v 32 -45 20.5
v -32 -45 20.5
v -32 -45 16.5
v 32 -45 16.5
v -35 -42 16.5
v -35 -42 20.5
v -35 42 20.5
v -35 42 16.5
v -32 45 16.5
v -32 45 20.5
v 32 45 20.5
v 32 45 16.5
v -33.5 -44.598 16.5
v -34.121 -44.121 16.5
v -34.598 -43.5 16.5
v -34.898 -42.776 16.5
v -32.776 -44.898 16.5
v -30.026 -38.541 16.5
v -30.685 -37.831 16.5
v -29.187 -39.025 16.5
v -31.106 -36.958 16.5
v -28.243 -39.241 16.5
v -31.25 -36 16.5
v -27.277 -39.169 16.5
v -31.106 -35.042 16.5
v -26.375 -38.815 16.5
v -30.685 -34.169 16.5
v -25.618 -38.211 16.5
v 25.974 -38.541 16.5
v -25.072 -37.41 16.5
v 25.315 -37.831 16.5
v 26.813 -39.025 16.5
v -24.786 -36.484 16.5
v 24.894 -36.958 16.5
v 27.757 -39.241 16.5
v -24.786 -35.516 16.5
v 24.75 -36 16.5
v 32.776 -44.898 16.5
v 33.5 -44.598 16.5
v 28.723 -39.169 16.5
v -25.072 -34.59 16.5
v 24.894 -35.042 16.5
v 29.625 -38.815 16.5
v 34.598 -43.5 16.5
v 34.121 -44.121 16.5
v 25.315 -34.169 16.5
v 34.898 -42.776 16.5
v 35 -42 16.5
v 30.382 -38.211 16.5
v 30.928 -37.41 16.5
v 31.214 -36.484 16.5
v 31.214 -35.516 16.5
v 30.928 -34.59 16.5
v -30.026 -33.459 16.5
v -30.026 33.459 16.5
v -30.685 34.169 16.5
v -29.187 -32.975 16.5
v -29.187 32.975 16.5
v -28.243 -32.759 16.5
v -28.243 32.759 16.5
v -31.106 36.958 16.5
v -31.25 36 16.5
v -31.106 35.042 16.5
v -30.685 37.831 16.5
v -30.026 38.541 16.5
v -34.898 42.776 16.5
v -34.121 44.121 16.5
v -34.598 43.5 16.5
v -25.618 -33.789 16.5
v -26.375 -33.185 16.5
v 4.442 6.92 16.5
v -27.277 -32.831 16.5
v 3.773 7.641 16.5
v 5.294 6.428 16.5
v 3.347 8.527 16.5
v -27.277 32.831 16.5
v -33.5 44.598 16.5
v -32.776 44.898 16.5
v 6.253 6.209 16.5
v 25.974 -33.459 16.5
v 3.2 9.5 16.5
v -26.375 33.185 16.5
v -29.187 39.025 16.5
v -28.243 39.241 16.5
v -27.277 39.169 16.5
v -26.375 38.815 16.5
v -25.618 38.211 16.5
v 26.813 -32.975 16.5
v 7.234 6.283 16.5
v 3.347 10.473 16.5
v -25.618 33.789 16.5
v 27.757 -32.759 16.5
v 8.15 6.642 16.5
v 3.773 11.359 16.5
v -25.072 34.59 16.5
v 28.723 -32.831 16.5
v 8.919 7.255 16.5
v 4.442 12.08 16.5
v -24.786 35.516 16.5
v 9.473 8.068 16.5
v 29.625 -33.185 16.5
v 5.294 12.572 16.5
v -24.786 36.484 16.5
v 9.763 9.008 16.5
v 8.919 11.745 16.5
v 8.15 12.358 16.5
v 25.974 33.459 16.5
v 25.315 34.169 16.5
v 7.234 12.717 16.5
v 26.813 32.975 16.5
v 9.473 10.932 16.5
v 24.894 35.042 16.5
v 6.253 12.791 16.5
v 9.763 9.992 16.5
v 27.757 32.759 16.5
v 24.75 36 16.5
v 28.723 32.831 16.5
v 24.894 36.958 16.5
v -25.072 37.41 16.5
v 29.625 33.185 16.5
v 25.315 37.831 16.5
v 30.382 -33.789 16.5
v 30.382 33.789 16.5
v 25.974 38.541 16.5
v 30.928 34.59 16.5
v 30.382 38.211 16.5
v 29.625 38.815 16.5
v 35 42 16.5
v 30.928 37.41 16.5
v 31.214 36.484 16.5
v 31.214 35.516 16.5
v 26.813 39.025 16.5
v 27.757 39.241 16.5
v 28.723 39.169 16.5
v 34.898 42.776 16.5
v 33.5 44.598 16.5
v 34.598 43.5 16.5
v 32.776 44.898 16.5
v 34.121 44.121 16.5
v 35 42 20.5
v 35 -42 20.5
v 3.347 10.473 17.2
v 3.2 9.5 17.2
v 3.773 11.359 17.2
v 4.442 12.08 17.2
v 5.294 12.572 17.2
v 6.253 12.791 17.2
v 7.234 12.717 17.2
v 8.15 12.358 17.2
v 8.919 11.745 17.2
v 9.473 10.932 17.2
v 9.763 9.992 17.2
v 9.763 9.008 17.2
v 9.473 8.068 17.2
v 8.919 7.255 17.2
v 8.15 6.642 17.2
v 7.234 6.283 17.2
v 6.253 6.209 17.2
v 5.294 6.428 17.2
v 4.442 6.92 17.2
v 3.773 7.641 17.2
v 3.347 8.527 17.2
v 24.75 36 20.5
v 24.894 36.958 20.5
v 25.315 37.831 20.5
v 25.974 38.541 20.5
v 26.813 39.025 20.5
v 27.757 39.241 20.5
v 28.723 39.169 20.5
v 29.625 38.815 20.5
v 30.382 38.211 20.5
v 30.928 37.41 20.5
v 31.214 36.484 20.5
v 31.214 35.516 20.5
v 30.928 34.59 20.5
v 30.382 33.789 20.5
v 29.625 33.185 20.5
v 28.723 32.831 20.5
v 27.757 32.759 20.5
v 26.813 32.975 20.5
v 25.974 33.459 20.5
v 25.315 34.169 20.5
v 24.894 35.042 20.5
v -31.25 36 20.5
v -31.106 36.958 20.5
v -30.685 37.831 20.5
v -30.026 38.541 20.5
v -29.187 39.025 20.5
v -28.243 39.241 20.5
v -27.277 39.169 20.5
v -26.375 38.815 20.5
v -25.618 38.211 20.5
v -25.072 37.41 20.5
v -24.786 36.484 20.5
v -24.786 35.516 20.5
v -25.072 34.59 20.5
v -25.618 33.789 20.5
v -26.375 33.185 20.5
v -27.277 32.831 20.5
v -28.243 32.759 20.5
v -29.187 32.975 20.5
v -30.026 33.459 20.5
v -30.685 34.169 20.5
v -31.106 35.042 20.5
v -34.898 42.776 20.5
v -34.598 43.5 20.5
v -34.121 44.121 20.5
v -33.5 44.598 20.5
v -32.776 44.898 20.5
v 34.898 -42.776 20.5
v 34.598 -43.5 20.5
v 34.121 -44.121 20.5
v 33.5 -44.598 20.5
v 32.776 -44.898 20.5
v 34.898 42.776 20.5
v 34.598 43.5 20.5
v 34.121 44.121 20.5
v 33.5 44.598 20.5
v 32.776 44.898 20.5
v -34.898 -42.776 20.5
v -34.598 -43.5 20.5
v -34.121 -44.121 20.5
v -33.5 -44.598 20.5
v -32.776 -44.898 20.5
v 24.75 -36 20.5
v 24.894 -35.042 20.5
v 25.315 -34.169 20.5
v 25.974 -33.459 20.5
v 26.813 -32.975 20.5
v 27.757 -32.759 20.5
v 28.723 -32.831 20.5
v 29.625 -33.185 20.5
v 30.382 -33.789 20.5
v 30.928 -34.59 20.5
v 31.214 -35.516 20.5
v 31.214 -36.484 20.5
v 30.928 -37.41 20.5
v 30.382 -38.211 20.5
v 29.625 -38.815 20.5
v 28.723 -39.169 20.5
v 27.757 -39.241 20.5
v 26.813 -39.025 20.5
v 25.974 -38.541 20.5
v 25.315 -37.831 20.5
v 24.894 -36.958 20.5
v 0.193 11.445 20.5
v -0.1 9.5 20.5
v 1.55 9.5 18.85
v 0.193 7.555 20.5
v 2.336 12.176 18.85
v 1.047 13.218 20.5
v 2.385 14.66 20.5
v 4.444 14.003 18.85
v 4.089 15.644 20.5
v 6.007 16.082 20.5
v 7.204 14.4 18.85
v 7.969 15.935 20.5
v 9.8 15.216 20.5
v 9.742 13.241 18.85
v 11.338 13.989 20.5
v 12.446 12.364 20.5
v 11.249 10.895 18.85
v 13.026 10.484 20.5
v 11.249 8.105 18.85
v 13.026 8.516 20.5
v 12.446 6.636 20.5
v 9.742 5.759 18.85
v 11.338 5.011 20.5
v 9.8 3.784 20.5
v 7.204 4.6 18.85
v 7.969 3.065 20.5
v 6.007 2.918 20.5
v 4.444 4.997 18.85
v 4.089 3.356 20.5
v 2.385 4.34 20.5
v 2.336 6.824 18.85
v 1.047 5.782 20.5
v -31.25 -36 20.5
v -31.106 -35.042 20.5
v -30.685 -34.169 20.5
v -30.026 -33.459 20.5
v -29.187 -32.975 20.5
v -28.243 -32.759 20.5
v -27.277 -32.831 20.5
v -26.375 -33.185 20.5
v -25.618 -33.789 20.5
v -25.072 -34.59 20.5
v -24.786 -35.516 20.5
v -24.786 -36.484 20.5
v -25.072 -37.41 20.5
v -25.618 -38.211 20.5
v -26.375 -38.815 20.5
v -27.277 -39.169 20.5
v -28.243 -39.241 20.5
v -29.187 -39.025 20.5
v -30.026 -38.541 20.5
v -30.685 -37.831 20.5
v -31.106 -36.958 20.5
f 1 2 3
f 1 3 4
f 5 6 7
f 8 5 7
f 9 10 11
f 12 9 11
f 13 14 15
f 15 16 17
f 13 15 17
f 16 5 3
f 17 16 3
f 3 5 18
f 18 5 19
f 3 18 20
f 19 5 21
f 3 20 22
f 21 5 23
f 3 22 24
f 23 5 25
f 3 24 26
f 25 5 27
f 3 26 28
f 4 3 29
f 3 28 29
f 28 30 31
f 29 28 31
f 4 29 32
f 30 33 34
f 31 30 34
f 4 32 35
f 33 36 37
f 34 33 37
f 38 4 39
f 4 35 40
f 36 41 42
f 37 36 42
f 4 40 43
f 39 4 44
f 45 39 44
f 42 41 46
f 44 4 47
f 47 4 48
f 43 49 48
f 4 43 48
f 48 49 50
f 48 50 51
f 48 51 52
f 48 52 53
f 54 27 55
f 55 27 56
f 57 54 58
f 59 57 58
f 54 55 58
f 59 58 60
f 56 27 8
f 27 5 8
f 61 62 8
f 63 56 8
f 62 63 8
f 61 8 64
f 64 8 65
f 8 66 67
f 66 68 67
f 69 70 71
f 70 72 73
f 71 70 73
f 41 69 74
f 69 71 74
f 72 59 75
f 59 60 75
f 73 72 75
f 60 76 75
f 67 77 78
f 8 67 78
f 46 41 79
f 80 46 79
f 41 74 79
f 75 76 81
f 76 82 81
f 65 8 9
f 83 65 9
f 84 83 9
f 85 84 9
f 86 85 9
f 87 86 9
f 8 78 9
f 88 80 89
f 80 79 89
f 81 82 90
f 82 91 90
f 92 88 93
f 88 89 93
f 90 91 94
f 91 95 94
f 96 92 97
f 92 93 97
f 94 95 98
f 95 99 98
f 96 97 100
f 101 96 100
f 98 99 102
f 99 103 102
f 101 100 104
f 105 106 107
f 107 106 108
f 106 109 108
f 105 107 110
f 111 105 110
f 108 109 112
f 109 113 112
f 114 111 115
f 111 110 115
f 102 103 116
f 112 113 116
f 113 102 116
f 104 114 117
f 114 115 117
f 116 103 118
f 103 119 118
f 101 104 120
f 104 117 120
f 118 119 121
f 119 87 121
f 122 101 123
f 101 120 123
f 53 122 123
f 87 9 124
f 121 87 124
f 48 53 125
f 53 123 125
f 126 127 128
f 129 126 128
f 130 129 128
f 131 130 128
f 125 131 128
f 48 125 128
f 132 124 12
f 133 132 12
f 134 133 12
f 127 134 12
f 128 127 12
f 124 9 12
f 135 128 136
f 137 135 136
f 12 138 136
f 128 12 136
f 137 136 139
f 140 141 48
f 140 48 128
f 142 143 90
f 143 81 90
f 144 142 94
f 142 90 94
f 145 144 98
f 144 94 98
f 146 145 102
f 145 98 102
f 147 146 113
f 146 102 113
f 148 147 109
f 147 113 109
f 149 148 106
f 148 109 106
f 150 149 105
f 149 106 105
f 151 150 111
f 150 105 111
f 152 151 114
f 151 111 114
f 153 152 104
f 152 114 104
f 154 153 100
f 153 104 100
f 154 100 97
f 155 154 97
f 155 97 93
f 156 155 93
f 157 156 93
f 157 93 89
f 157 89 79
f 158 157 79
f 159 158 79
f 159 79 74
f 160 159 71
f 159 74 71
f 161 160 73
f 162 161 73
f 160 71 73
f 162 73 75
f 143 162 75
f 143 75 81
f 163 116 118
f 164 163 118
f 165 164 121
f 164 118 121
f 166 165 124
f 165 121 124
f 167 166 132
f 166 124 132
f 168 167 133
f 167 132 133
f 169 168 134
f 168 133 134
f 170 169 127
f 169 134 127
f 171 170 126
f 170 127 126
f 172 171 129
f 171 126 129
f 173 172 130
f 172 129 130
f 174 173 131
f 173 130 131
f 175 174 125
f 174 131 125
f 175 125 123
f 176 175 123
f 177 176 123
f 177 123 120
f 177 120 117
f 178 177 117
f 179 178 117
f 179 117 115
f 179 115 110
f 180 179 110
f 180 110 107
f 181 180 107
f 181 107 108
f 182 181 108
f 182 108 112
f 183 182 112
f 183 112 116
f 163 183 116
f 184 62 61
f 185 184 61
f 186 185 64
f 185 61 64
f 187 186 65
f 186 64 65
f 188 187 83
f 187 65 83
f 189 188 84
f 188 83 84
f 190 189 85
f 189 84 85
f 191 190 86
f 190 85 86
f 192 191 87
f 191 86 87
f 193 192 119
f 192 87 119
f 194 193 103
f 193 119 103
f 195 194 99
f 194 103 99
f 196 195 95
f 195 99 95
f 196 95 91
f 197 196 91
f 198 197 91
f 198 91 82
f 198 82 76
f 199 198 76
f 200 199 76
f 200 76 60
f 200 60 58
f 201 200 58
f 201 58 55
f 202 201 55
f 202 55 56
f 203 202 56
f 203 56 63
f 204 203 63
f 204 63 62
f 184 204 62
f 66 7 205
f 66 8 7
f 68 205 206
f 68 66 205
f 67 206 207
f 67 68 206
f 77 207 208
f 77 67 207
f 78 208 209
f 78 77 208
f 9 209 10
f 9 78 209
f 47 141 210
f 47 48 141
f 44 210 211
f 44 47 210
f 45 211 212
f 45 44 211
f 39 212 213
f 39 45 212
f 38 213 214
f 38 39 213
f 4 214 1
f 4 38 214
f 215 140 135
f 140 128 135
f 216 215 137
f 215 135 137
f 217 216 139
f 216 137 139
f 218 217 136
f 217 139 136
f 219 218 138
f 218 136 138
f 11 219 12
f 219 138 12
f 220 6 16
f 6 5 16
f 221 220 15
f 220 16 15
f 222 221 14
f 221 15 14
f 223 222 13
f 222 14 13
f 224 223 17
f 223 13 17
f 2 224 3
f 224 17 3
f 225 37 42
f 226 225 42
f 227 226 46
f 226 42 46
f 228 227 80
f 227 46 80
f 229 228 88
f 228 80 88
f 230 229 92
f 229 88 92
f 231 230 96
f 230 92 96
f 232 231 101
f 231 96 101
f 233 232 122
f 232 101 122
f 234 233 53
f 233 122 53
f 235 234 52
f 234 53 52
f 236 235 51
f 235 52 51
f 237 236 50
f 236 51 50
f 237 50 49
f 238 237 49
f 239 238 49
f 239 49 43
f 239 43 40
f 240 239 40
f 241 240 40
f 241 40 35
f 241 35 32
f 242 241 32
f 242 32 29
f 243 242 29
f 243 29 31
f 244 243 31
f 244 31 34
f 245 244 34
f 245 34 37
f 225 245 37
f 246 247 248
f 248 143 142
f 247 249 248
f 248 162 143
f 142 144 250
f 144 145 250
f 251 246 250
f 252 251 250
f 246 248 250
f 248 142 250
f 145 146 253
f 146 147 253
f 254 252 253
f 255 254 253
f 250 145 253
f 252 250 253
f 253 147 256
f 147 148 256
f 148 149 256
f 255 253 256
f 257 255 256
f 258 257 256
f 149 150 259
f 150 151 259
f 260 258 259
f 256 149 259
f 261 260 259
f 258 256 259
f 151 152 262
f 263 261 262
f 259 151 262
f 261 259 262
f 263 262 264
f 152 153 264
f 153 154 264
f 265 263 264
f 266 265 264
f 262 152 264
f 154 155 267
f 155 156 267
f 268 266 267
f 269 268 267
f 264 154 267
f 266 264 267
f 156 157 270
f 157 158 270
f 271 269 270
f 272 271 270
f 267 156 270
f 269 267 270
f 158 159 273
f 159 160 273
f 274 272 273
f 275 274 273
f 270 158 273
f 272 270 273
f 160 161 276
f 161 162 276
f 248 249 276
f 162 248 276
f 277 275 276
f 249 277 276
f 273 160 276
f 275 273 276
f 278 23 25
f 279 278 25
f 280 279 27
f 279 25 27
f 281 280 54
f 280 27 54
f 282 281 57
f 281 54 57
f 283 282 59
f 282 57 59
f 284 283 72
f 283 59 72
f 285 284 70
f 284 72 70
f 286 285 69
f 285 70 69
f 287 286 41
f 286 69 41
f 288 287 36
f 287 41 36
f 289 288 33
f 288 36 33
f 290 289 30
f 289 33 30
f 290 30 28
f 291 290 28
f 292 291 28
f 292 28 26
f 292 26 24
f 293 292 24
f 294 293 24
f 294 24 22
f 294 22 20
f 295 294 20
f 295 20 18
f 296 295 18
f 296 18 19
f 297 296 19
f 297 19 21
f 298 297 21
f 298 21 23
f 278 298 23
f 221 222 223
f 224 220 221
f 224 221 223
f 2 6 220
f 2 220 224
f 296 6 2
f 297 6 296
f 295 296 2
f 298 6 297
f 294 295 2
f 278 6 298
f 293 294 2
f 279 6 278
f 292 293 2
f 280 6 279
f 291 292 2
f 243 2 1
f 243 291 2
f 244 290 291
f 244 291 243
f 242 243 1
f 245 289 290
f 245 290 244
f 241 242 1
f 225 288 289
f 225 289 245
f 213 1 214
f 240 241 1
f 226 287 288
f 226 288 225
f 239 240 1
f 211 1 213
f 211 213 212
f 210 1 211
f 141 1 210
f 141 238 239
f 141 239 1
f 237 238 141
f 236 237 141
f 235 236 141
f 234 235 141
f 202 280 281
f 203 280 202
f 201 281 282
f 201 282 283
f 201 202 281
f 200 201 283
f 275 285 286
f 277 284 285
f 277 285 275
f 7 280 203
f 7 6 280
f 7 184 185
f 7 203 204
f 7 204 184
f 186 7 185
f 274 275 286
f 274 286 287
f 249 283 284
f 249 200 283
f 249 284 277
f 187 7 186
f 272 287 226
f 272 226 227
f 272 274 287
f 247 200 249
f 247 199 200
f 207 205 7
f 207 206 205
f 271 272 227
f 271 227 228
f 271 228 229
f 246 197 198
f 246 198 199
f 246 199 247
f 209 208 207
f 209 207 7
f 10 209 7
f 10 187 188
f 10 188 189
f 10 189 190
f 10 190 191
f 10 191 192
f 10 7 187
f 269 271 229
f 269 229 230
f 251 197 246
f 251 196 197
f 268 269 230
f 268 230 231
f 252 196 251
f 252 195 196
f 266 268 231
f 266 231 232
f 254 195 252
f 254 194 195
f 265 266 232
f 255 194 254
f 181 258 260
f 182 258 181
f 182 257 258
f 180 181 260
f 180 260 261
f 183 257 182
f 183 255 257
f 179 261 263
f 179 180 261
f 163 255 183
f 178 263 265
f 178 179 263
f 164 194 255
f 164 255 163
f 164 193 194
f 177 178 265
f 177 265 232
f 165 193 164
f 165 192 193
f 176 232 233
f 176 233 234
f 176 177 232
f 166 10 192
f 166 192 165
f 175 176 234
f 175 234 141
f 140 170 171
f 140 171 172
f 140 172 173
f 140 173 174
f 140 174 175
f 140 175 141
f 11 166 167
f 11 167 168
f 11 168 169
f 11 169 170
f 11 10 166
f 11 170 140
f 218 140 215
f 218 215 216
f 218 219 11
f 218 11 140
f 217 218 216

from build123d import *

# Parameters (mm, degrees)
SKETCH_1_W                  = 55
SKETCH_1_H                  = 60
EXTRUDE_1_DEPTH             = 16.5
HOLE_WIZARD_3_6_3_6_1_D     = 3.6
HOLE_WIZARD_3_6_3_6_1_DEPTH = 25
HOLE_WIZARD_3_6_3_6_1_TIP   = 1.081549114
HOLE_WIZARD_M2_5_1_D        = 2.05
HOLE_WIZARD_M2_5_1_DEPTH    = 14
HOLE_WIZARD_M2_5_1_TIP      = 0.615882135
SKETCH_8_W                  = 35
SKETCH_8_H                  = 20.4
CUT_EXTRUDE_1_DEPTH         = 44.914690025
CUT_EXTRUDE_START           = 2.5
SKETCH_9_W                  = 20
SKETCH_9_H                  = 6
CUT_EXTRUDE_2_DEPTH         = 42.414690025
SHELL_START                 = 1.8
SHELL_1_DEPTH               = 14.7
EXTRUDE_2_DEPTH             = 4
SKETCH_16_R                 = 3
CUT_EXTRUDE_4_DEPTH         = 12
CUT_EXTRUDE_5_DEPTH         = 45.787721532
CUT_EXTRUDE_5_DEPTH_BACK    = 45.787721532
SKETCH_17_R                 = 2.5
FILLET_1_R                  = 0.5
FILLET_2_R                  = 0.5
SKETCH_21_W                 = 70
SKETCH_21_H                 = 90
EXTRUDE_3_DEPTH             = 4
SKETCH_24_R                 = 8.656208536
SKETCH_24_R_2               = 4.782814597
EXTRUDE_4_DEPTH             = 4
HOLE_WIZARD_6_5_6_5_1_D     = 6.5
HOLE_WIZARD_1_D             = 6.6
HOLE_WIZARD_1_DEPTH         = 17
HOLE_WIZARD_1_CSINK_D       = 13.2
HOLE_WIZARD_1_CSINK_ANGLE   = 90
HOLE_WIZARD_1_TIP           = 1.982840043
FILLET_3_R                  = 3


# Read off the part's stored shape, not the designer's step: 抽壳1
with BuildPart() as part:
    # 草图1 → 凸台-拉伸1 (new body)
    with BuildSketch(Plane.XY):
        Rectangle(SKETCH_1_W, SKETCH_1_H)
    extrude(amount=EXTRUDE_1_DEPTH)

    # Ø3.6 (3.6) 直径孔1
    with Locations(Plane.XY.offset(16.5)):
        with Locations((-24, 21.5), (24, 21.5), (24, -6), (-15, -26.5)):
            Hole(HOLE_WIZARD_3_6_3_6_1_D / 2, depth=HOLE_WIZARD_3_6_3_6_1_DEPTH)
            with Locations((0, 0, -(HOLE_WIZARD_3_6_3_6_1_DEPTH + HOLE_WIZARD_3_6_3_6_1_TIP / 2))):  # 118° drill point
                Cone(0, HOLE_WIZARD_3_6_3_6_1_D / 2, HOLE_WIZARD_3_6_3_6_1_TIP, mode=Mode.SUBTRACT)

    # M2.5 螺纹孔1
    with Locations(Plane.XY.offset(16.5)):
        with Locations((-24, 26.5), (24, 26.5), (24, -1), (-22.5, -26.5)):
            Hole(HOLE_WIZARD_M2_5_1_D / 2, depth=HOLE_WIZARD_M2_5_1_DEPTH)
            with Locations((0, 0, -(HOLE_WIZARD_M2_5_1_DEPTH + HOLE_WIZARD_M2_5_1_TIP / 2))):  # 118° drill point
                Cone(0, HOLE_WIZARD_M2_5_1_D / 2, HOLE_WIZARD_M2_5_1_TIP, mode=Mode.SUBTRACT)

    # 草图8 → 切除-拉伸1 (cut, through all)
    with BuildSketch(Plane.XY.offset(16.5)):
        with Locations((10, -19.8)):
            Rectangle(SKETCH_8_W, SKETCH_8_H)
    extrude(amount=-CUT_EXTRUDE_1_DEPTH, mode=Mode.SUBTRACT)

    # 草图9 → 切除-拉伸2 (cut, through all)
    with BuildSketch(Plane(origin=(0, 0, 16.5), x_dir=(-1, 0, 0), z_dir=(0, 0, -1)).offset(CUT_EXTRUDE_START)):
        with Locations((17.5, -27)):
            Rectangle(SKETCH_9_W, SKETCH_9_H)
    extrude(amount=CUT_EXTRUDE_2_DEPTH, mode=Mode.SUBTRACT)

    # 抽壳1 outline → 抽壳1 (cut)
    with BuildSketch(Plane.XY.offset(SHELL_START)):
        with BuildLine():
            ThreePointArc((-21.743758657, 28.2), (-21.182110509, 26.299690696), (-22.006919283, 24.4979375))
            ThreePointArc((-22.006919283, 24.4979375), (-20.910890356, 19.651378458), (-25.7, 18.326673669))
            Line((-25.7, 18.326673669), (-25.7, -22.2))
            Line((-25.7, -22.2), (-9.3, -22.2))
            Line((-9.3, -22.2), (-9.3, -7.8))
            Line((-9.3, -7.8), (20.882308546, -7.8))
            ThreePointArc((20.882308546, -7.8), (20.494996561, -5.178446051), (22.006919283, -3.0020625))
            ThreePointArc((22.006919283, -3.0020625), (21.865811165, 0.8509087), (25.7, 1.256241343))
            Line((25.7, 1.256241343), (25.7, 18.326673669))
            ThreePointArc((25.7, 18.326673669), (20.910890356, 19.651378458), (22.006919283, 24.4979375))
            ThreePointArc((22.006919283, 24.4979375), (21.182110509, 26.299690696), (21.743758657, 28.2))
            Line((21.743758657, 28.2), (-21.743758657, 28.2))
        make_face()
    extrude(amount=SHELL_1_DEPTH, mode=Mode.SUBTRACT)

    # 草图16 → 切除-拉伸4 (cut)
    with BuildSketch(Plane(origin=(-7.5, 0, 0), x_dir=(0, 0, -1), z_dir=(1, 0, 0))):
        with Locations(Location((-8, -18, 0), (0, 0, 90))):
            Circle(SKETCH_16_R)
    extrude(amount=-CUT_EXTRUDE_4_DEPTH, mode=Mode.SUBTRACT)


with BuildPart() as body_2:
    # 草图10 → 凸台-拉伸2 (new body)
    with BuildSketch(Plane.XY.offset(16.5)):
        Polygon((-27.5, -30), (-7.5, -30), (-7.5, -9.6), (27.5, -9.6), (27.5, 30), (-27.5, 30), align=None)
    extrude(amount=EXTRUDE_2_DEPTH)


with BuildPart() as cut_extrude_5_tool:
    # 草图17 → 切除-拉伸5 (new, two sides: drawn at the far end of the back side and taken through both)
    with BuildSketch(Plane.XY.offset(1.8).offset(-CUT_EXTRUDE_5_DEPTH_BACK)):
        with Locations((6.5, 9.5)):
            Circle(SKETCH_17_R)
    extrude(amount=CUT_EXTRUDE_5_DEPTH + CUT_EXTRUDE_5_DEPTH_BACK)


with BuildPart() as part_1:
    add(part.part)

    # 切除-拉伸5: cut by cut_extrude_5_tool
    add(cut_extrude_5_tool.part, mode=Mode.SUBTRACT)

    # 圆角1
    fillet_1_edges = [part_1.edges().sort_by_distance(p)[0] for p in [
        (-27.5, 3, 0),
        (0, 30, 0),
        (27.5, 10.2, 0),
        (27.5, -9.6, 8.25),
        (-7.5, -16.8, 0),
        (10, -9.6, 0),
        (-7.5, -9.6, 8.25),
        (-7.5, -30, 15.25),
        (-27.5, -30, 15.25),
        (-27.5, 30, 8.25),
        (27.5, 30, 8.25),
        (-17.5, -24, 0),
        (-7.5, -24, 7),
        (-27.5, -24, 7),
    ]]
    fillet(fillet_1_edges, radius=FILLET_1_R)


with BuildPart() as body_2_1:
    add(body_2.part)

    # 切除-拉伸5: cut by cut_extrude_5_tool
    add(cut_extrude_5_tool.part, mode=Mode.SUBTRACT)

    # 圆角2
    fillet_2_edges = [body_2_1.edges().sort_by_distance(p)[0] for p in [
        (-27.5, 30, 18.5),
        (27.5, 30, 18.5),
        (27.5, -9.6, 18.5),
        (-7.5, -9.6, 18.5),
        (-7.5, -30, 18.5),
        (-27.5, -30, 18.5),
    ]]
    fillet(fillet_2_edges, radius=FILLET_2_R)

    # 草图21 → 凸台-拉伸3 (add)
    with BuildSketch(Plane.XY.offset(20.5)):
        Rectangle(SKETCH_21_W, SKETCH_21_H)
        with BuildLine():
            Line((-27, -30), (-8, -30))
            ThreePointArc((-8, -30), (-7.646446609, -29.853553391), (-7.5, -29.5))
            Line((-7.5, -29.5), (-7.5, -10.1))
            ThreePointArc((-7.5, -10.1), (-7.353553391, -9.746446609), (-7, -9.6))
            Line((-7, -9.6), (27, -9.6))
            ThreePointArc((27, -9.6), (27.353553391, -9.453553391), (27.5, -9.1))
            Line((27.5, -9.1), (27.5, 29.5))
            ThreePointArc((27.5, 29.5), (27.353553391, 29.853553391), (27, 30))
            Line((27, 30), (-27, 30))
            ThreePointArc((-27, 30), (-27.353553391, 29.853553391), (-27.5, 29.5))
            Line((-27.5, 29.5), (-27.5, -29.5))
            ThreePointArc((-27.5, -29.5), (-27.353553391, -29.853553391), (-27, -30))
        make_face(mode=Mode.SUBTRACT)
    extrude(amount=-EXTRUDE_3_DEPTH)

    # 草图24 → 凸台-拉伸4 (add)
    with BuildSketch(Plane(origin=(0, 0, 16.5), x_dir=(-1, 0, 0), z_dir=(0, 0, -1))):
        with Locations((-6.5, 9.5)):
            Circle(SKETCH_24_R)
        with Locations((-6.5, 9.5)):
            Circle(SKETCH_24_R_2, mode=Mode.SUBTRACT)
    extrude(amount=-EXTRUDE_4_DEPTH)

    # Ø6.5 (6.5) 直径孔1 (through all)
    with Locations(Plane.XY.offset(20.5)):
        with Locations((-28, 36), (28, 36), (28, -36), (-28, -36)):
            Hole(HOLE_WIZARD_6_5_6_5_1_D / 2)

    # 打孔尺寸(%根据十字)槽沉头木螺钉的类型1
    with Locations(Plane.XY.offset(20.5)):
        with Locations((6.5, 9.5)):
            CounterSinkHole(HOLE_WIZARD_1_D / 2, HOLE_WIZARD_1_CSINK_D / 2, depth=HOLE_WIZARD_1_DEPTH, counter_sink_angle=HOLE_WIZARD_1_CSINK_ANGLE)
            with Locations((0, 0, -(HOLE_WIZARD_1_DEPTH + HOLE_WIZARD_1_TIP / 2))):  # 118° drill point
                Cone(0, HOLE_WIZARD_1_D / 2, HOLE_WIZARD_1_TIP, mode=Mode.SUBTRACT)

    # 圆角3
    fillet_3_edges = [body_2_1.edges().sort_by_distance(p)[0] for p in [
        (-35, 45, 18.5),
        (-35, -45, 18.5),
        (35, -45, 18.5),
        (35, 45, 18.5),
    ]]
    fillet(fillet_3_edges, radius=FILLET_3_R)


solid = body_2_1.part
